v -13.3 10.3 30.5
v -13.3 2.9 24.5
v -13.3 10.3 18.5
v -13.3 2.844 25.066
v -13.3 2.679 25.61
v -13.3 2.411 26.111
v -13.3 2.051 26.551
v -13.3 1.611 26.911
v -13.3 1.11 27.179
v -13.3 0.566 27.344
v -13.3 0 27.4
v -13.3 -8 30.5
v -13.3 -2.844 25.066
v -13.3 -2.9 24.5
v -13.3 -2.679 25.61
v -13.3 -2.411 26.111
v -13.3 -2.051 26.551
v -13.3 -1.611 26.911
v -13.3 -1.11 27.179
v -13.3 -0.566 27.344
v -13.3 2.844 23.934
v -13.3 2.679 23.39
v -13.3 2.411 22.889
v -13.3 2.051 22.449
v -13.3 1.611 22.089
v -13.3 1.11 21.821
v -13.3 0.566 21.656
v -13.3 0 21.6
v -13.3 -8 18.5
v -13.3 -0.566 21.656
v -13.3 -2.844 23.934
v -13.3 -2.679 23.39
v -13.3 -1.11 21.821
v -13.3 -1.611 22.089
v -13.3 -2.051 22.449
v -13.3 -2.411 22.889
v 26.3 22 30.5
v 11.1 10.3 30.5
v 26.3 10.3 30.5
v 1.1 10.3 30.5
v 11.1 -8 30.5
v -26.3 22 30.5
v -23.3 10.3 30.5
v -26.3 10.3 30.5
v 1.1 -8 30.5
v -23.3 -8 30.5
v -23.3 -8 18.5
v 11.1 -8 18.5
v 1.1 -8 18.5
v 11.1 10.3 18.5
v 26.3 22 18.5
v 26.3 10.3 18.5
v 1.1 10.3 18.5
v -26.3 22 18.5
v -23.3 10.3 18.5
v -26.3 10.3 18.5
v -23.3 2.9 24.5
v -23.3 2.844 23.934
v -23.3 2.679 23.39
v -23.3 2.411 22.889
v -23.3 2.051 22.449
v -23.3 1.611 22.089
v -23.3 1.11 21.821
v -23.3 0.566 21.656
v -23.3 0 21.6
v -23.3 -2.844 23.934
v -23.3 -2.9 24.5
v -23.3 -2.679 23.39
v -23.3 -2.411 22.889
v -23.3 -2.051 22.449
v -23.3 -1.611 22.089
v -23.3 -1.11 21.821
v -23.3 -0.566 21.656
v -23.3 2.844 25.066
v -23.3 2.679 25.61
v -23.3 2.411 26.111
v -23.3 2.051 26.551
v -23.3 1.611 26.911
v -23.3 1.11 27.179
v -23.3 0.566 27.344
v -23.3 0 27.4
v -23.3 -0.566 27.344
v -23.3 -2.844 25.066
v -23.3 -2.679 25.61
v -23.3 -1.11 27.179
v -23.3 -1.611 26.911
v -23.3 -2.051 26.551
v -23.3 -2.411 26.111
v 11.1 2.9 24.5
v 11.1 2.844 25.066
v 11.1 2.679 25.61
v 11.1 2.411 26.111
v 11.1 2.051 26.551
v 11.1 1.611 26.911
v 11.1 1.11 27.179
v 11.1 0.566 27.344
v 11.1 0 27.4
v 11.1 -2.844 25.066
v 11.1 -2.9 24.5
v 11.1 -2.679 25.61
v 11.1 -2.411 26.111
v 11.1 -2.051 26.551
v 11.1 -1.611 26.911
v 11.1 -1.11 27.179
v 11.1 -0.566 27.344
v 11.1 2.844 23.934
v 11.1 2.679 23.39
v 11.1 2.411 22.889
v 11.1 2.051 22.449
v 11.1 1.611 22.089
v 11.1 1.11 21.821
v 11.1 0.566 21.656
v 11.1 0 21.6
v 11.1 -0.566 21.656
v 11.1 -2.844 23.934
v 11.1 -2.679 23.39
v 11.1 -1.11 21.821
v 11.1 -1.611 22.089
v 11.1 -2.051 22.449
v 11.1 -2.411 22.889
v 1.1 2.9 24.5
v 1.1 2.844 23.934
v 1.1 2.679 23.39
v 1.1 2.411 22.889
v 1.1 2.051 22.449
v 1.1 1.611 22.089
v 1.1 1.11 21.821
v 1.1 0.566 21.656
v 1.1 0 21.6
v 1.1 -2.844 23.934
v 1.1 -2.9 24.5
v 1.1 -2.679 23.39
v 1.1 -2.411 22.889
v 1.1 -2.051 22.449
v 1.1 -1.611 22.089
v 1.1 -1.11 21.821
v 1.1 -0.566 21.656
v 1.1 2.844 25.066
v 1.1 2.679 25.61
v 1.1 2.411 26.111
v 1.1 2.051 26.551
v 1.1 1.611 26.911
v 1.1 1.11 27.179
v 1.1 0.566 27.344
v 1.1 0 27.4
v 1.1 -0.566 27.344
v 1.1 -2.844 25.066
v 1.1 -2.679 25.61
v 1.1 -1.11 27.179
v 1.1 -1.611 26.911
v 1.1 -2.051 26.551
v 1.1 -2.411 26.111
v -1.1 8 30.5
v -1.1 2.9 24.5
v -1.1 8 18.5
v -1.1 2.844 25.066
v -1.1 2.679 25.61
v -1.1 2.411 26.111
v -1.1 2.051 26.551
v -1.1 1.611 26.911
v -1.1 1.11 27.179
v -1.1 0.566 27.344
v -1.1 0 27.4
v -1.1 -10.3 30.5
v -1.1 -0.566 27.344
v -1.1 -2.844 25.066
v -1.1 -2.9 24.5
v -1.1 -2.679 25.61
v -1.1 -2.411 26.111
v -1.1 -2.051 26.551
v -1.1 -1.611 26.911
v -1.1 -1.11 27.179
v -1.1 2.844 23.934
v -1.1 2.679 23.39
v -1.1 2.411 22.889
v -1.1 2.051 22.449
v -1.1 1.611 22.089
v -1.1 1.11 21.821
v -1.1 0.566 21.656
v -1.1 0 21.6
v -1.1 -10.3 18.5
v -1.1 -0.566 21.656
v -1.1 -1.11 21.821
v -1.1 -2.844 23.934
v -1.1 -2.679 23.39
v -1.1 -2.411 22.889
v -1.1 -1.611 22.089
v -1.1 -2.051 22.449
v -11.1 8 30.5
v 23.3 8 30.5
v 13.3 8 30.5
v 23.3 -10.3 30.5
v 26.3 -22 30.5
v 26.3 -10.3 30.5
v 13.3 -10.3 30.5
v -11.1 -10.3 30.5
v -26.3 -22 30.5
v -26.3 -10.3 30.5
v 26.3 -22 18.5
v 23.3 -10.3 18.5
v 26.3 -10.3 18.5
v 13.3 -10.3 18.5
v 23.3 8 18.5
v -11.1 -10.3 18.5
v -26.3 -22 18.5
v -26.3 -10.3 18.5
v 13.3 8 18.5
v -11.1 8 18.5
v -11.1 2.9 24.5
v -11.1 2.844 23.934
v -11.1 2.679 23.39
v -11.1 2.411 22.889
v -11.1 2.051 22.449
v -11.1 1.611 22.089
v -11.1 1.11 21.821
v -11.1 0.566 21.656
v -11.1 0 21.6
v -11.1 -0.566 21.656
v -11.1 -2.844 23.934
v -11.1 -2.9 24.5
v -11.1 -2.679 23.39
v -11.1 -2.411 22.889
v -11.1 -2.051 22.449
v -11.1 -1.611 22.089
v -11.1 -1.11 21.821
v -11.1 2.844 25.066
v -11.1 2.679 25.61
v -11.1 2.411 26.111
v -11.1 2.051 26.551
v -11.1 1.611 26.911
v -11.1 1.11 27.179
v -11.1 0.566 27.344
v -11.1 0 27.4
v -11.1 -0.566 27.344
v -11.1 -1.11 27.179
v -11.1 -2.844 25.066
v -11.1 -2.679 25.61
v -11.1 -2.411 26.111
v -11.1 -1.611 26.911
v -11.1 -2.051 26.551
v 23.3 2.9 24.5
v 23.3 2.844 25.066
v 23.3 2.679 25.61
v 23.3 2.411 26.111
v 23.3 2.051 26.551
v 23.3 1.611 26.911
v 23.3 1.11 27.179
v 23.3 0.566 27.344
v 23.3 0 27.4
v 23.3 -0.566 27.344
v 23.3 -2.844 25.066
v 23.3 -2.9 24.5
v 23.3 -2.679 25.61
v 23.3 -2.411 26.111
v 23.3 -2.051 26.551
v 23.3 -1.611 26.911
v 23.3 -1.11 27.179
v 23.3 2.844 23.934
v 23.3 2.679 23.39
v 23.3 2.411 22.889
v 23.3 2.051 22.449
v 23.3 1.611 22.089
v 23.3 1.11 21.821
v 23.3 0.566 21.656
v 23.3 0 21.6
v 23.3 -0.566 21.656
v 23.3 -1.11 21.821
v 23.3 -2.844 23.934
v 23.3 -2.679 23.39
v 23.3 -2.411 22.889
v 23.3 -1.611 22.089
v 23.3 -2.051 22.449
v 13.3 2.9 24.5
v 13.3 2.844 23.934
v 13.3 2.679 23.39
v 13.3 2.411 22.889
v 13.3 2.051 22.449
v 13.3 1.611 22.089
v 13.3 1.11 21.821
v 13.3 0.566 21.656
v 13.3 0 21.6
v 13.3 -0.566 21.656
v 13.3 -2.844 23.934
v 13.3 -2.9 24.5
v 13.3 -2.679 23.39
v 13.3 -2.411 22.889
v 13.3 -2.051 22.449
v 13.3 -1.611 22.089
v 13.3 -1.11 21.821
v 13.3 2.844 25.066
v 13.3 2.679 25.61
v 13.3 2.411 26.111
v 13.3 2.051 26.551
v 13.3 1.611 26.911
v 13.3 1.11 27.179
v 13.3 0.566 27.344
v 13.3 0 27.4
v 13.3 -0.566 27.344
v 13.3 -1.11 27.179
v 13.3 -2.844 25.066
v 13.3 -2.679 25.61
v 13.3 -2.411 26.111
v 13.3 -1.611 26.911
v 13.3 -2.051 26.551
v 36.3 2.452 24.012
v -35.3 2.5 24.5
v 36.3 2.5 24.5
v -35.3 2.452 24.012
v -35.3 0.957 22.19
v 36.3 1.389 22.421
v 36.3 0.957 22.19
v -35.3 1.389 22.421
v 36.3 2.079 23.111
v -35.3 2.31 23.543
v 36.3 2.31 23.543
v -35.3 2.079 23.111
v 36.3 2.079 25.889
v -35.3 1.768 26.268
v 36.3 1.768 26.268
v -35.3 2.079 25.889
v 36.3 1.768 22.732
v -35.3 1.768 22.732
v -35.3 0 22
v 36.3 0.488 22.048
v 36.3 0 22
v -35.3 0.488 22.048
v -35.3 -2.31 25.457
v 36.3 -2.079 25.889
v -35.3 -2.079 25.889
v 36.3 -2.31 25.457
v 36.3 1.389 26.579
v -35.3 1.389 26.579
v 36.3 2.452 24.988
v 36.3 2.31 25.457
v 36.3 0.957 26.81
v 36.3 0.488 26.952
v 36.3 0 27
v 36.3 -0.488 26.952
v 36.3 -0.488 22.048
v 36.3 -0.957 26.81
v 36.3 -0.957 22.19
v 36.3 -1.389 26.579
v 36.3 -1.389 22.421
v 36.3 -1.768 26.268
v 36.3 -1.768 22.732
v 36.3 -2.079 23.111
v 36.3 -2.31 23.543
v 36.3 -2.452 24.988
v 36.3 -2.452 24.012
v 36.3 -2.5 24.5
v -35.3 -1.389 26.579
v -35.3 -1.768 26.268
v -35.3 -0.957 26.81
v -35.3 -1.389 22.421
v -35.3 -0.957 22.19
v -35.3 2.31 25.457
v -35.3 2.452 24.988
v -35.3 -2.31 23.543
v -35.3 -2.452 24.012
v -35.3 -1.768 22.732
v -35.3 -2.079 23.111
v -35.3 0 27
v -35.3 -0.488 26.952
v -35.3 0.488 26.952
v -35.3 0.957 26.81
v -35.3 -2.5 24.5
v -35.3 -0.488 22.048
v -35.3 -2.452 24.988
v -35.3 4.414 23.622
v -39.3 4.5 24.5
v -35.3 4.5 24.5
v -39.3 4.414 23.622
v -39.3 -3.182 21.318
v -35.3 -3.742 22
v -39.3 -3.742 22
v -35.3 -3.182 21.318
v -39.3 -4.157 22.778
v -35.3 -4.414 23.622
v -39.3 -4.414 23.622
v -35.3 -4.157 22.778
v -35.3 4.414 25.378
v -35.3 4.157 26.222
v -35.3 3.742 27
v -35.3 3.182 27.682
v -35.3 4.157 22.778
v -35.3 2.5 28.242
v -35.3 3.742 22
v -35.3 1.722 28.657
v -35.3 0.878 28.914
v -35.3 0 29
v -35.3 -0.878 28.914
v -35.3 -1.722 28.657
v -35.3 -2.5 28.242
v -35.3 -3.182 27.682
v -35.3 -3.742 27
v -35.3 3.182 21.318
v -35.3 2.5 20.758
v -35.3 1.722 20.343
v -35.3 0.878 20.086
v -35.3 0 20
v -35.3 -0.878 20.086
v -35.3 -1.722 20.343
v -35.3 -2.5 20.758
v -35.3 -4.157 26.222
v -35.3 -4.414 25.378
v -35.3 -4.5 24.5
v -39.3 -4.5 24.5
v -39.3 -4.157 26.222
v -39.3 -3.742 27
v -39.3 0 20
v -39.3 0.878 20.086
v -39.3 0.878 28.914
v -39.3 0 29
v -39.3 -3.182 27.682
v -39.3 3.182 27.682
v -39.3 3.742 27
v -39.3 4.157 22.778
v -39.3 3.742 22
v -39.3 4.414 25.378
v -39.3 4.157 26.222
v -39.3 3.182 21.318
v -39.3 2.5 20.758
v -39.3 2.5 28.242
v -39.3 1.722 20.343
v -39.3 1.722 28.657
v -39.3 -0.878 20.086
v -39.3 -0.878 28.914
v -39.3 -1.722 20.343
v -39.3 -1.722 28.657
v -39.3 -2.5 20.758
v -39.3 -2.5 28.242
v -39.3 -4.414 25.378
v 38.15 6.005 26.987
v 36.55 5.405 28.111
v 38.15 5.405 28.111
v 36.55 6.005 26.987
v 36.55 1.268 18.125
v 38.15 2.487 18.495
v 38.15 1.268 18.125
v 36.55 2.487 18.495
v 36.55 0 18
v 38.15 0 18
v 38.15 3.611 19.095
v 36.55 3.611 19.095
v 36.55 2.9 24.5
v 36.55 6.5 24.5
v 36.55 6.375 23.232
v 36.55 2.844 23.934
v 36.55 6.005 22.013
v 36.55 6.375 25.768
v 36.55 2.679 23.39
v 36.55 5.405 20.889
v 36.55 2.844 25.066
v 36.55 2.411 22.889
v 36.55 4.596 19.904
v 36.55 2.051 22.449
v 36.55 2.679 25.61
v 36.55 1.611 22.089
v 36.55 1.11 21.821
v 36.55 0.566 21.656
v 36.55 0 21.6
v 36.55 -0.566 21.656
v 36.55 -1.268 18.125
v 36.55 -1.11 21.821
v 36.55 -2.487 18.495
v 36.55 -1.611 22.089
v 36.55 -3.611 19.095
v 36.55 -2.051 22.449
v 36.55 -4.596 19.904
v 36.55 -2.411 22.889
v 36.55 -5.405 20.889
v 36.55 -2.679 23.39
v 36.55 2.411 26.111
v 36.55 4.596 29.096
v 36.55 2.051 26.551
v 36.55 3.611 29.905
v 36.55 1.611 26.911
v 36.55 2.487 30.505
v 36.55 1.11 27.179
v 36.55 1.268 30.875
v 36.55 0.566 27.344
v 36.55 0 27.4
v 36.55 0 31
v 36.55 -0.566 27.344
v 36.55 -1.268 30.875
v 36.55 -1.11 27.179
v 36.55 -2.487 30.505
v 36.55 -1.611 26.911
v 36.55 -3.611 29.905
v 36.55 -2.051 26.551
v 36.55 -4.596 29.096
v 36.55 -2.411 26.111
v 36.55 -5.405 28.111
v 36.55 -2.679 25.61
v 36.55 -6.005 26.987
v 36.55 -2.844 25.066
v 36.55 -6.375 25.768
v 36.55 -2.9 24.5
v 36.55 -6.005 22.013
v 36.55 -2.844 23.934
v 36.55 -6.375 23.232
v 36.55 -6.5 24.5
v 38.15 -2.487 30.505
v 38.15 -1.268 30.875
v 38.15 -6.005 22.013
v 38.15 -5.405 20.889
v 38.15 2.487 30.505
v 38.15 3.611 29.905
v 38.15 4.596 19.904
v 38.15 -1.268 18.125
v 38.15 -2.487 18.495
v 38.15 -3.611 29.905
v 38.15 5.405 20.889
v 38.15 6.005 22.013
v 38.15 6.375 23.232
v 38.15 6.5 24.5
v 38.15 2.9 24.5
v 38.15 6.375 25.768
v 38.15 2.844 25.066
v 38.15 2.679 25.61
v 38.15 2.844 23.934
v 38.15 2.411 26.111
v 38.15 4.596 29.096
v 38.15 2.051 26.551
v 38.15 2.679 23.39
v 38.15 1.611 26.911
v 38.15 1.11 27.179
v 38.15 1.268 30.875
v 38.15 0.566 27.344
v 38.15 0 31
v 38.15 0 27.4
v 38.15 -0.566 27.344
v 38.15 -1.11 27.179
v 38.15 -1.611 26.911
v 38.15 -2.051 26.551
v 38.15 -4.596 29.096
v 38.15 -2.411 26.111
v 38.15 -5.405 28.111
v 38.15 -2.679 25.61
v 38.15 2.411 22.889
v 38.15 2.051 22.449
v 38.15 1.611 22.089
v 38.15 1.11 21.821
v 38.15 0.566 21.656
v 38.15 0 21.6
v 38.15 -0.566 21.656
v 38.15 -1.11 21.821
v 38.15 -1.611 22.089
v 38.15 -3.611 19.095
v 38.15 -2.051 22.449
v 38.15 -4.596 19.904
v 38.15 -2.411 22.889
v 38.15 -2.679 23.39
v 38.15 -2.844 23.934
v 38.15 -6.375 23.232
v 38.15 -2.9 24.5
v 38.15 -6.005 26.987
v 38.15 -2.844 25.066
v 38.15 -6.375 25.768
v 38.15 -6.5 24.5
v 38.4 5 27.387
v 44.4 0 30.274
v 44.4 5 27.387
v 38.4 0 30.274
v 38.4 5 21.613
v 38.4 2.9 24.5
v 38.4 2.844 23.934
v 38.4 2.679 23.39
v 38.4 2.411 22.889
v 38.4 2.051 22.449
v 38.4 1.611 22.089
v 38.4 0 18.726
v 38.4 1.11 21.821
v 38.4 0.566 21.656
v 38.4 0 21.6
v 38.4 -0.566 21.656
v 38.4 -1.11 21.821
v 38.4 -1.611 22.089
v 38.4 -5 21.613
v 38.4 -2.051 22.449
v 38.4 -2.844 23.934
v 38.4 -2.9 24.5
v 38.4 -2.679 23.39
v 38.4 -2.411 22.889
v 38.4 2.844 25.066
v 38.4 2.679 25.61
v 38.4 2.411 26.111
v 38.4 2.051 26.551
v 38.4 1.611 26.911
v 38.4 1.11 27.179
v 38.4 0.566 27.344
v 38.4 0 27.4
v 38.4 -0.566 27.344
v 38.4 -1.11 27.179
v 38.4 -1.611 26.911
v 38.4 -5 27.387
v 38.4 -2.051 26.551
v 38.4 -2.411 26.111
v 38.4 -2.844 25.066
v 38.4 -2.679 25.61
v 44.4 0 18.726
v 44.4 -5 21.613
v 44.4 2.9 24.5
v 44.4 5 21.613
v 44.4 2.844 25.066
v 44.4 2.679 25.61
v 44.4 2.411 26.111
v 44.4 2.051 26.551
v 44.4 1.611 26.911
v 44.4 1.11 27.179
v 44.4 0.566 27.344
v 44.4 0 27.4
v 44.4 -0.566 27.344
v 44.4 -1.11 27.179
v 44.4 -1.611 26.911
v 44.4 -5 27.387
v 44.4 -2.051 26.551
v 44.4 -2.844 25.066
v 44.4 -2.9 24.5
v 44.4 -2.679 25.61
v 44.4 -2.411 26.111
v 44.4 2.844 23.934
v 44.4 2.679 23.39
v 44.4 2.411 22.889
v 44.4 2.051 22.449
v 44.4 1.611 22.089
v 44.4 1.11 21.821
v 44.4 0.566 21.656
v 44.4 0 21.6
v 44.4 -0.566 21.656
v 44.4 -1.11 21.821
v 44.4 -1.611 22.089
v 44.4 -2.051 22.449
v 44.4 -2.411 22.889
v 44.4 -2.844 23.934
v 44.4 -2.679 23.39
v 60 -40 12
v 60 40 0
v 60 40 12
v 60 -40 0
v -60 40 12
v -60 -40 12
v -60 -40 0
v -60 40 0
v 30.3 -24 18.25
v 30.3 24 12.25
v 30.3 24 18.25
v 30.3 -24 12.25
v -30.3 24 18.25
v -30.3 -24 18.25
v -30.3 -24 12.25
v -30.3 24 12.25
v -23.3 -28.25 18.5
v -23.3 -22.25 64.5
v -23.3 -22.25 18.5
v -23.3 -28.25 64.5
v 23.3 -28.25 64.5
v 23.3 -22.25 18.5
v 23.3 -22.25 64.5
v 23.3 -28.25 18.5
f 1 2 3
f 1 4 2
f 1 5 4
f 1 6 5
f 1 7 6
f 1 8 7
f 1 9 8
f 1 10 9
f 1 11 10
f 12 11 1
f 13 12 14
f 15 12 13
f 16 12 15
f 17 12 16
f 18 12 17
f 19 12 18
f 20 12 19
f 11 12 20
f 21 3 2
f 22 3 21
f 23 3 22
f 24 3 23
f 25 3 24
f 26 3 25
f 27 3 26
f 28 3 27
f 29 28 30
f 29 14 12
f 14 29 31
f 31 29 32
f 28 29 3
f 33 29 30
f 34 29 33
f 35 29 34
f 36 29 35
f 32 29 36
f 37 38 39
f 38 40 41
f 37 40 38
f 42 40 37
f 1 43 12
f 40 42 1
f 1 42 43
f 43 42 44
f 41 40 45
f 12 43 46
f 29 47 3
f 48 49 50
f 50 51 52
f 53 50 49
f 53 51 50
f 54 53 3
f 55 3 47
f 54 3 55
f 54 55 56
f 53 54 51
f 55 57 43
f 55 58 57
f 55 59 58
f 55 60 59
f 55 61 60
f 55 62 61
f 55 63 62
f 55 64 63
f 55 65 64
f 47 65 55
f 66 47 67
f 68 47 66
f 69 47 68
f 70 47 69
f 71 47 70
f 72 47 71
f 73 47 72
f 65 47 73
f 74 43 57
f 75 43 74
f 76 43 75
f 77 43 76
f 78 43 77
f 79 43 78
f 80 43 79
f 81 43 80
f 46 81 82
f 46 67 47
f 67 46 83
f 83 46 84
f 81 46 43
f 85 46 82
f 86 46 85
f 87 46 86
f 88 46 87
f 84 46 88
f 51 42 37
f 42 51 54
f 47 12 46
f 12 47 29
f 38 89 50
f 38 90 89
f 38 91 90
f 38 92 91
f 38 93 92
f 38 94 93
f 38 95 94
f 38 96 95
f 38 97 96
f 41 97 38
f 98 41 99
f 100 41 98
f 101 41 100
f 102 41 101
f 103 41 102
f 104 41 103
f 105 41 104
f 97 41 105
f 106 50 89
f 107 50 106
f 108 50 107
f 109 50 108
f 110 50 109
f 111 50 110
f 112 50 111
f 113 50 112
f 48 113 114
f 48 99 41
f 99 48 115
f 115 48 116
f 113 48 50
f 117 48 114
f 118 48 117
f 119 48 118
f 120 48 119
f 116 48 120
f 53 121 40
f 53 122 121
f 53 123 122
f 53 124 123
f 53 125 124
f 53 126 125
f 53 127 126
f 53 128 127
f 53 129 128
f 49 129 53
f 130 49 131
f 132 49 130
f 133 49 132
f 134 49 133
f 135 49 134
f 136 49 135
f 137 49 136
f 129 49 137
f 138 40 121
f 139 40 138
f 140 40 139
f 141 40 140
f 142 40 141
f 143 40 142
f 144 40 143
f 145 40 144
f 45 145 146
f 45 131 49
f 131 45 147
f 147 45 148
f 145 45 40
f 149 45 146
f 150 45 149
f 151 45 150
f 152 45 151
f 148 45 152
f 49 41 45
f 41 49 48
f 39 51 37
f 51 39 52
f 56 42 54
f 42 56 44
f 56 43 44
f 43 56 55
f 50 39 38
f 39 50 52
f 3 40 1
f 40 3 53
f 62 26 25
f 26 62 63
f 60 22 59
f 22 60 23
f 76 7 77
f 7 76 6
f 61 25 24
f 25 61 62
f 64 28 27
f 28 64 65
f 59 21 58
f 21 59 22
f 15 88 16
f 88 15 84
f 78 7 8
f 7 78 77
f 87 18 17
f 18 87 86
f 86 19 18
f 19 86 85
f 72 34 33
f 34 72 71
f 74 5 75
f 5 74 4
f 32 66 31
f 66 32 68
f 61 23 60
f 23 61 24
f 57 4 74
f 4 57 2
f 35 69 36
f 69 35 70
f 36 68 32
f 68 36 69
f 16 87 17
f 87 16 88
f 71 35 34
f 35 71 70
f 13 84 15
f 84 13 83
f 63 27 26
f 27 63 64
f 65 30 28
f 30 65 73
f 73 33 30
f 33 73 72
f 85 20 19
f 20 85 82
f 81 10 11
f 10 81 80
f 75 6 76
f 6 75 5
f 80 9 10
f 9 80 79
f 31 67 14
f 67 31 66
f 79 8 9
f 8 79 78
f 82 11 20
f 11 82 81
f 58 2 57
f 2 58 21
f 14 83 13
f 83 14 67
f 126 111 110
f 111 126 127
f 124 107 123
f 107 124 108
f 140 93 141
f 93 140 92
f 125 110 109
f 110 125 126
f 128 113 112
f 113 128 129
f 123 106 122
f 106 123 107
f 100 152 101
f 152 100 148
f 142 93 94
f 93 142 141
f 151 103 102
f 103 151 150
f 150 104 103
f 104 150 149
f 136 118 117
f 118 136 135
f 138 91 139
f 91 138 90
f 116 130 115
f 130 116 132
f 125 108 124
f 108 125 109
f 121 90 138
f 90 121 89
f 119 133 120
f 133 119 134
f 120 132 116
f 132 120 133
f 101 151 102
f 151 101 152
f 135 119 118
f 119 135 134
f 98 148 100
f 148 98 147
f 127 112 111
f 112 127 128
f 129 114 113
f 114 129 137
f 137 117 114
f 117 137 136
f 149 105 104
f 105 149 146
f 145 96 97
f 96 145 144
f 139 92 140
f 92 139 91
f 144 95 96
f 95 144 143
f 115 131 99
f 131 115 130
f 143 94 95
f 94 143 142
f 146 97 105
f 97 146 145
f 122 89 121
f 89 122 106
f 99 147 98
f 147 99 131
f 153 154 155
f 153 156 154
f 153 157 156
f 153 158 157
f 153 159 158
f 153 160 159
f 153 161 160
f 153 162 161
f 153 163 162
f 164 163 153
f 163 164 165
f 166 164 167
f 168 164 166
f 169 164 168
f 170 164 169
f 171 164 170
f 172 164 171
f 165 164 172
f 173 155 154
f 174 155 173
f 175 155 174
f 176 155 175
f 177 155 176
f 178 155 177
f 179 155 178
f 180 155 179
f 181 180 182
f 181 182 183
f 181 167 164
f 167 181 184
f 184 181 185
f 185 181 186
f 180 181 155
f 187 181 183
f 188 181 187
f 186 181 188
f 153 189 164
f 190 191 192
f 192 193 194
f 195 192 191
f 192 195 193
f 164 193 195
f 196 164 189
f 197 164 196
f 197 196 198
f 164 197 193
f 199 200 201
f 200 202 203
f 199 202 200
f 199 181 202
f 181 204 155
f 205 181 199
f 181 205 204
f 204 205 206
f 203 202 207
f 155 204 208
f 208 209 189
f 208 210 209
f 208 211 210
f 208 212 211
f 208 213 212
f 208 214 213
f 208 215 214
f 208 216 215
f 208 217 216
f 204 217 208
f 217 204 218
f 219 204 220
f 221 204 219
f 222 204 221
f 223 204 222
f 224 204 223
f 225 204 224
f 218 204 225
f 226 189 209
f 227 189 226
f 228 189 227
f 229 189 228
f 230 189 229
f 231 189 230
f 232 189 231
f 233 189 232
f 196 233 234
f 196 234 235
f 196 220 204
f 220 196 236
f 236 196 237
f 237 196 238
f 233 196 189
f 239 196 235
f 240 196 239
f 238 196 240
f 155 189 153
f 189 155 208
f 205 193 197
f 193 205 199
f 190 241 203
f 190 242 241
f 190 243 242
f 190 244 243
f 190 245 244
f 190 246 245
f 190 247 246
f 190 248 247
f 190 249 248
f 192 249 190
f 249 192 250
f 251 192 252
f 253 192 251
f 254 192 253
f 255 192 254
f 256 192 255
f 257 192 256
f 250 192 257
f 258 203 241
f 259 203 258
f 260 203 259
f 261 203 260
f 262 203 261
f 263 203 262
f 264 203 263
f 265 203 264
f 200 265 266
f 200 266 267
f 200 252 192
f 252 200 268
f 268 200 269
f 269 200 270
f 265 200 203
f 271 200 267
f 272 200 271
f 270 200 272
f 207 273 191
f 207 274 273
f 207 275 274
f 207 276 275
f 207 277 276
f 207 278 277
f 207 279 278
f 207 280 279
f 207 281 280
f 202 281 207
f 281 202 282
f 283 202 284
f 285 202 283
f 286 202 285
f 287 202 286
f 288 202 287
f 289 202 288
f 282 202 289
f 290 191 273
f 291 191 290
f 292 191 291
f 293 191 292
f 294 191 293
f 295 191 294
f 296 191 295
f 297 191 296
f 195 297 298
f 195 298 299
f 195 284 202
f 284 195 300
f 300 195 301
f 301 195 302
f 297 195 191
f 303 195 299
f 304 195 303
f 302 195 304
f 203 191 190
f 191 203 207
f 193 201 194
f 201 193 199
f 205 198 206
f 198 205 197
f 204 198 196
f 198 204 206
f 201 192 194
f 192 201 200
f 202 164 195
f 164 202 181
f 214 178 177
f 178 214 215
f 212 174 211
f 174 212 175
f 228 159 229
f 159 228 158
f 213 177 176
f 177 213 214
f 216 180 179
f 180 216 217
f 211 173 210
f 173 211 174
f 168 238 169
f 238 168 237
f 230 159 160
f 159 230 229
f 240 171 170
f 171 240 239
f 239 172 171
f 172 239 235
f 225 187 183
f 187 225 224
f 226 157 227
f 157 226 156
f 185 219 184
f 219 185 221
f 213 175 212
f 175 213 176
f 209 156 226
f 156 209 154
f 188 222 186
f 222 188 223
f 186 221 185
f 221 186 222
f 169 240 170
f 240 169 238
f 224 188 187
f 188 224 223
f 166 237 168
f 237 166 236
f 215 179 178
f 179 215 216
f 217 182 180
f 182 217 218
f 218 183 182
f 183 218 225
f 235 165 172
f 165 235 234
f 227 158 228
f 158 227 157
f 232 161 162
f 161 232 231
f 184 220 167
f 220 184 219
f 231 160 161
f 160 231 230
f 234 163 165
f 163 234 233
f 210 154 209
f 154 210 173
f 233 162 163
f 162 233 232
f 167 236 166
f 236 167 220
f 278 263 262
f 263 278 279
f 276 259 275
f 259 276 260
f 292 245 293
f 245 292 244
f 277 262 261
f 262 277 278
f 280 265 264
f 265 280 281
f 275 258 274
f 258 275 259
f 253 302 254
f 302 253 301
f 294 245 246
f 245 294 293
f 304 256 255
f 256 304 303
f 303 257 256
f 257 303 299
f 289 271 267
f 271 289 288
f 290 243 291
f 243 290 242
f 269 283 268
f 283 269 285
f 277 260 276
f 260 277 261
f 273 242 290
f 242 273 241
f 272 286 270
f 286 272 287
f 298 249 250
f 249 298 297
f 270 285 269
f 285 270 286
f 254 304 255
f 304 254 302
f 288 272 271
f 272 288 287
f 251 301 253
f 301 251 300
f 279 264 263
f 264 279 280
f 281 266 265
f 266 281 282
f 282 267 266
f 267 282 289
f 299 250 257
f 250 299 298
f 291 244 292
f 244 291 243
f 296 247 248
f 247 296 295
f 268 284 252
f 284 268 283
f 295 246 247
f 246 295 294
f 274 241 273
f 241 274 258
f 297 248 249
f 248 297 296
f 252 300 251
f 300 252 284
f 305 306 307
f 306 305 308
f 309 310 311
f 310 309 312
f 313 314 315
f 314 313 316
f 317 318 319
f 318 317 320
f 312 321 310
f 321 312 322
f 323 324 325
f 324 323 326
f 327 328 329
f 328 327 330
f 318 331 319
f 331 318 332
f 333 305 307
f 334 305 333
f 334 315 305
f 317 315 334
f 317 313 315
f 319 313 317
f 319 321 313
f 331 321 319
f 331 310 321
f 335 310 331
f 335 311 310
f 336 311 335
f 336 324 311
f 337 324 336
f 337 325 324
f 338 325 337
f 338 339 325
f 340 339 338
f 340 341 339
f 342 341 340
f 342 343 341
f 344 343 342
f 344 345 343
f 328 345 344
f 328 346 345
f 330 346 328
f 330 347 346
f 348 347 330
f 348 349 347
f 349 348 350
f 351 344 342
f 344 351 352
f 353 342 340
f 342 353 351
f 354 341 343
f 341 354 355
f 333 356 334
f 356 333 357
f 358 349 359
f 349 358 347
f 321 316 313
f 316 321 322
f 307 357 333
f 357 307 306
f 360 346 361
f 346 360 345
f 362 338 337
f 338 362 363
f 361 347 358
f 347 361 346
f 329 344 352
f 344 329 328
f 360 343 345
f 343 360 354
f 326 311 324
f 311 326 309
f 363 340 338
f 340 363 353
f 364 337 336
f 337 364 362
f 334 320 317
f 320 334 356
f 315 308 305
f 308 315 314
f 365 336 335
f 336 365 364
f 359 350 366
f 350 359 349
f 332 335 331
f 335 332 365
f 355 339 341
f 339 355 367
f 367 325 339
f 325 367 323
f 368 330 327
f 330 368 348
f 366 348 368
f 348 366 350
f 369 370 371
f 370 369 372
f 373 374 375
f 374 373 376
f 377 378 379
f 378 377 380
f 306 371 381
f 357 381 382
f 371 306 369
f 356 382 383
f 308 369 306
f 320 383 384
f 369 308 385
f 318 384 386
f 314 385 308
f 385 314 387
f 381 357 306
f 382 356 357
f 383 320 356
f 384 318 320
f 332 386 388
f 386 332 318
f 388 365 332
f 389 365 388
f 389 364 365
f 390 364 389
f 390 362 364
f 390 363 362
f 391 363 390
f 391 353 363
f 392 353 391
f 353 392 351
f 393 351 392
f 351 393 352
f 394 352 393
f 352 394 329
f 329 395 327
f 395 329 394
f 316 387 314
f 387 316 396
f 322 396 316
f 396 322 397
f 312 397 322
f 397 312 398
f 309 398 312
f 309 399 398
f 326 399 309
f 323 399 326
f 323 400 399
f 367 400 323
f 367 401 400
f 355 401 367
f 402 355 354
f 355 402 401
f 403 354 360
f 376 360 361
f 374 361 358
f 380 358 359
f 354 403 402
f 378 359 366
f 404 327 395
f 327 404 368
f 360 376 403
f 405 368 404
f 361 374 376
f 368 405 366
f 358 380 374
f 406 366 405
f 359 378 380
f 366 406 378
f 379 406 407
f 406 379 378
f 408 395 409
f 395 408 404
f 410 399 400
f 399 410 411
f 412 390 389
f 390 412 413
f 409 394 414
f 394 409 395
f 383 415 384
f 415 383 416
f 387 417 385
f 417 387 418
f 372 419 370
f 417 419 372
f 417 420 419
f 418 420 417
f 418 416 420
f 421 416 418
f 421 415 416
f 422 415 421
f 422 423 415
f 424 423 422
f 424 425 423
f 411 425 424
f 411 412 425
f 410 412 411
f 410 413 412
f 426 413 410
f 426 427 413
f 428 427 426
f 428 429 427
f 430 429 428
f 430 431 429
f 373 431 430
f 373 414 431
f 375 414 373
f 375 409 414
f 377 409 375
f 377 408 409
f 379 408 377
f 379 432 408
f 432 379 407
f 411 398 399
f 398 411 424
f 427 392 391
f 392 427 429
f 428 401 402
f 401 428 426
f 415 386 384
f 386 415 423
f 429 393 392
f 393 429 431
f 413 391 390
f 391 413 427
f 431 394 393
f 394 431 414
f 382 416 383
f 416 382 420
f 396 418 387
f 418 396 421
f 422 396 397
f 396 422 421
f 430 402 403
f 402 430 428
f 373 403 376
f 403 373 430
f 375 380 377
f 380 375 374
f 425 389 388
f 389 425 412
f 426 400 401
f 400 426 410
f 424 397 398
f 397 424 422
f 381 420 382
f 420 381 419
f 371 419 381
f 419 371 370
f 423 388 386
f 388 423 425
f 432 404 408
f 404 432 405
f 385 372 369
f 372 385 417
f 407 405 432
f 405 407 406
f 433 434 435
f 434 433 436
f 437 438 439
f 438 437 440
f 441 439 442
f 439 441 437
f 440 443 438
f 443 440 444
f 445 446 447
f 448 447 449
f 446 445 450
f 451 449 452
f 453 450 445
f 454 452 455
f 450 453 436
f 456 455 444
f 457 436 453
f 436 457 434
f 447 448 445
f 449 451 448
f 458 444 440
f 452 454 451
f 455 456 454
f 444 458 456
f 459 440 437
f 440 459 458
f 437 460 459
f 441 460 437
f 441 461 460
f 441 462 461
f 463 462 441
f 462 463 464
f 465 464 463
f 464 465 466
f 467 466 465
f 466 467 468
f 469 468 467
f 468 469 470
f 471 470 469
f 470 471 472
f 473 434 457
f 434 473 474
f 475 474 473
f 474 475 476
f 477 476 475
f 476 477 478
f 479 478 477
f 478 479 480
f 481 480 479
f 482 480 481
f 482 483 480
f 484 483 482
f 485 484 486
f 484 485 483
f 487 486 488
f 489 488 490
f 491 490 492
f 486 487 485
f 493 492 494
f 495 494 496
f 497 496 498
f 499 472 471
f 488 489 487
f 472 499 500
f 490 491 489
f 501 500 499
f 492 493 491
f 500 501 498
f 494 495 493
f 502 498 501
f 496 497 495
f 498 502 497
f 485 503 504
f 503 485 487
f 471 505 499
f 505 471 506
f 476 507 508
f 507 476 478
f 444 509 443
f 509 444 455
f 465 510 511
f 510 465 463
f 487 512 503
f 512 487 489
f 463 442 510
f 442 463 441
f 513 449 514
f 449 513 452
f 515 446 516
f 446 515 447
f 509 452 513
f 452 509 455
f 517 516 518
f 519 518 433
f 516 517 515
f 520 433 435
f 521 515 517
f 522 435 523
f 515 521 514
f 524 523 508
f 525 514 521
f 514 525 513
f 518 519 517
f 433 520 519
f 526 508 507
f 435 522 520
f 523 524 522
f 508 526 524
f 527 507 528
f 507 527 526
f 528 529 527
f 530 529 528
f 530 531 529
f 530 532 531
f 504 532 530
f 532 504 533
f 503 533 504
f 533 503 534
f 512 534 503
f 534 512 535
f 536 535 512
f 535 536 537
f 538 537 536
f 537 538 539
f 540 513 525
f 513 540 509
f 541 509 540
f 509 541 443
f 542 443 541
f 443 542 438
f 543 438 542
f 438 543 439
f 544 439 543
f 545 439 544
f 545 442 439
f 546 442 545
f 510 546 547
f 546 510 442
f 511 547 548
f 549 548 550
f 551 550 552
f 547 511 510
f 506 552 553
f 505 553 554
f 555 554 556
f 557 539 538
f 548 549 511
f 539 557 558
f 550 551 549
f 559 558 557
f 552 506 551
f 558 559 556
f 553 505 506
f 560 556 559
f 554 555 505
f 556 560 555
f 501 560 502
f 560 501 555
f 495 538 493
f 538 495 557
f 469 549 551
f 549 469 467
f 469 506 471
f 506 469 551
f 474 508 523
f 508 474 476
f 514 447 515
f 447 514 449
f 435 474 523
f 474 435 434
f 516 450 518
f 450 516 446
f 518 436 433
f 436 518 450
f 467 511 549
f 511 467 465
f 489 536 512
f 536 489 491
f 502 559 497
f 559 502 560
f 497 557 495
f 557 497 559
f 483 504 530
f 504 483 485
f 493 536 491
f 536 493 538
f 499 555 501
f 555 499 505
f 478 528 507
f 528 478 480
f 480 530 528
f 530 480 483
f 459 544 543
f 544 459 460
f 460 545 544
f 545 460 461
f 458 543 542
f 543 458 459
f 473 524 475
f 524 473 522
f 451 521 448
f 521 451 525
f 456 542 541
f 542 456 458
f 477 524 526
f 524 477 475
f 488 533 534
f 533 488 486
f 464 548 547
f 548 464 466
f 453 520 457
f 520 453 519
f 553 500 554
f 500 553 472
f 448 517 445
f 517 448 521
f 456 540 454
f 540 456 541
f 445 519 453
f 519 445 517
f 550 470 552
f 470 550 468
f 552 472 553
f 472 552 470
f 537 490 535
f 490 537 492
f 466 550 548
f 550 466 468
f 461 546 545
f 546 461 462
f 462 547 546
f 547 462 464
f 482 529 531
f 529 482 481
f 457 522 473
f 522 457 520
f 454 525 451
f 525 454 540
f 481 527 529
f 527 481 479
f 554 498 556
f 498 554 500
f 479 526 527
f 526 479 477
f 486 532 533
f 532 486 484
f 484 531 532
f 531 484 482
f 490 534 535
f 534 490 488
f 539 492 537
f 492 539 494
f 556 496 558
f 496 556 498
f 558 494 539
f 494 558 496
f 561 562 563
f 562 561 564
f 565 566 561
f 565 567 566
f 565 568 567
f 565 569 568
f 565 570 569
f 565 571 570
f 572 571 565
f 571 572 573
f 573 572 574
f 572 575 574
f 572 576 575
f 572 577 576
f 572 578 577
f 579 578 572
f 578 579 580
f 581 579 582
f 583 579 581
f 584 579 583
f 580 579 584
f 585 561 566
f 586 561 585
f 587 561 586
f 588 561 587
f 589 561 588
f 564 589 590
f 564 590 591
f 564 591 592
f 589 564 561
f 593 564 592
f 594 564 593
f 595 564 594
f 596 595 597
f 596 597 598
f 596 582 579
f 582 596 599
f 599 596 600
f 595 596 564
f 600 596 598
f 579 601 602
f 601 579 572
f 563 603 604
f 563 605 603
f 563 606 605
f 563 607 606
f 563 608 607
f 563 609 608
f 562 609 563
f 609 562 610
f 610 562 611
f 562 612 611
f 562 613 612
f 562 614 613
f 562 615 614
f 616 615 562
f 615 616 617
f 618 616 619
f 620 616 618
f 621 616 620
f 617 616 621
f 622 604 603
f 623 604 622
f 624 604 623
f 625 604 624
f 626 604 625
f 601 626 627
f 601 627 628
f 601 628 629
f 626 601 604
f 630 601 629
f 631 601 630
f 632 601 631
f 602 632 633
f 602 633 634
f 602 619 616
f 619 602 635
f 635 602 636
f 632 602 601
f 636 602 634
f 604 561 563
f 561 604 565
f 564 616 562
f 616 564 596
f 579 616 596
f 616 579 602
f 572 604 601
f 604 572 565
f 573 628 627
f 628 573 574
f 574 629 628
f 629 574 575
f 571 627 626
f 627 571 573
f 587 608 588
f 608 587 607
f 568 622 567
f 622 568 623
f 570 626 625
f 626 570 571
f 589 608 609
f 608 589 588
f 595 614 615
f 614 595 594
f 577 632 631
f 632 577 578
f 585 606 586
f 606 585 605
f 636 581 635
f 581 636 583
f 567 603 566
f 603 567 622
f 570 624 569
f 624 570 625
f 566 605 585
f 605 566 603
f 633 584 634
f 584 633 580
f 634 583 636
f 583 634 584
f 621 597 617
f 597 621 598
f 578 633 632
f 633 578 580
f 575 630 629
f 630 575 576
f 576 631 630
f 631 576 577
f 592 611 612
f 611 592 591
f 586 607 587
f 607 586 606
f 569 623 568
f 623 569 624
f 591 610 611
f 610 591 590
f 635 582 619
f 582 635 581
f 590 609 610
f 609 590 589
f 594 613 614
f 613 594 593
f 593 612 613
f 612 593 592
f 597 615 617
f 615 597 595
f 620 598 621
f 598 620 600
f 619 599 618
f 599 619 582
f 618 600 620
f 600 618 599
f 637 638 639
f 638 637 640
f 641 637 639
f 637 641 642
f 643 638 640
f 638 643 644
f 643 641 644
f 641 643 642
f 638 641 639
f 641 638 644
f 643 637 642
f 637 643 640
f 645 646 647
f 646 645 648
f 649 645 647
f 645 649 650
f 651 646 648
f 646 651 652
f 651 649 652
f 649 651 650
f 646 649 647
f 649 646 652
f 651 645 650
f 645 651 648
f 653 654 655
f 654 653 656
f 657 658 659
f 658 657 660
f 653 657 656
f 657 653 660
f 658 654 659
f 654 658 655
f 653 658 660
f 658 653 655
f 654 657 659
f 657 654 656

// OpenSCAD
$fn = 32;

// ------------------------------------------------------------------------
// Comb hinge with flap: leaf 52.6 x 22 mm, pin d5, flap 46 mm
// Every part is its own module, assembly() places every instance.
// ------------------------------------------------------------------------

// --- part 1 ---
module hinge_bed() {
  difference() {
    translate([-60, -40, 0]) cube([120, 80, 12]);
  }
}

// --- part 2 ---
module hinge_riser() {
  difference() {
    translate([-30.3, -24, 0]) cube([60.6, 48, 6]);
  }
}

// --- part 3 ---
module hinge_leaf_a() {
  difference() {
    union() {
      translate([-23.3, -8, -6]) cube([10, 30, 12]);
      translate([1.1, -8, -6]) cube([10, 30, 12]);
      translate([-26.3, 10.3, -6]) cube([52.6, 11.7, 12]);
    }
    translate([-18.3, 0, 0]) rotate([0, 90, 0]) cylinder(h = 12, d = 5.8, center = true);
    translate([6.1, 0, 0]) rotate([0, 90, 0]) cylinder(h = 12, d = 5.8, center = true);
  }
}

// --- part 4 ---
module hinge_leaf_b() {
  difference() {
    union() {
      translate([-11.1, -22, -6]) cube([10, 30, 12]);
      translate([13.3, -22, -6]) cube([10, 30, 12]);
      translate([-26.3, -22, -6]) cube([52.6, 11.7, 12]);
    }
    translate([-6.1, 0, 0]) rotate([0, 90, 0]) cylinder(h = 12, d = 5.8, center = true);
    translate([18.3, 0, 0]) rotate([0, 90, 0]) cylinder(h = 12, d = 5.8, center = true);
  }
}

// --- part 5 ---
module hinge_flap() {
  difference() {
    translate([-23.3, -23, 0]) cube([46.6, 46, 6]);
  }
}

// --- part 6 ---
module hinge_pin() {
  rotate([0, 90, 0]) cylinder(h = 72.6, d = 5, center = true);
  translate([-39.3, 0, 0]) rotate([0, 90, 0]) cylinder(h = 4, d = 9);
}

// --- part 7 ---
module pin_washer() {
  difference() {
      translate([0, 0, 0]) cylinder(h = 1.6, d = 13);
      translate([0, 0, -1]) cylinder(h = 3.6, d = 5.8);
    }
}

// --- part 8 ---
module pin_nut() {
  difference() {
    linear_extrude(height = 6) polygon(points = [[5.774, 0], [2.887, 5], [-2.887, 5], [-5.774, 0], [-2.887, -5], [2.887, -5]]);
    translate([0, 0, -1]) cylinder(h = 8, d = 5.8);
  }
}

// --- assembly ---
module assembly() {
  color([0.80, 0.24, 0.20]) translate([0, 0, 0]) rotate([0, 0, 0]) hinge_bed();
  color([0.20, 0.45, 0.75]) translate([0, 0, 12.25]) rotate([0, 0, 0]) hinge_riser();
  color([0.25, 0.62, 0.32]) translate([0, 0, 24.5]) rotate([0, 0, 0]) hinge_leaf_a();
  color([0.92, 0.70, 0.18]) translate([0, 0, 24.5]) rotate([0, 0, 0]) hinge_leaf_b();
  color([0.58, 0.35, 0.70]) translate([0, -22.25, 41.5]) rotate([90, 0, 0]) hinge_flap();
  color([0.16, 0.66, 0.66]) translate([0, 0, 24.5]) rotate([0, 0, 0]) hinge_pin();
  color([0.85, 0.48, 0.18]) translate([36.55, 0, 24.5]) rotate([0, 90, 0]) pin_washer();
  color([0.55, 0.60, 0.65]) translate([38.4, 0, 24.5]) rotate([0, 90, 0]) pin_nut();
}

assembly();
